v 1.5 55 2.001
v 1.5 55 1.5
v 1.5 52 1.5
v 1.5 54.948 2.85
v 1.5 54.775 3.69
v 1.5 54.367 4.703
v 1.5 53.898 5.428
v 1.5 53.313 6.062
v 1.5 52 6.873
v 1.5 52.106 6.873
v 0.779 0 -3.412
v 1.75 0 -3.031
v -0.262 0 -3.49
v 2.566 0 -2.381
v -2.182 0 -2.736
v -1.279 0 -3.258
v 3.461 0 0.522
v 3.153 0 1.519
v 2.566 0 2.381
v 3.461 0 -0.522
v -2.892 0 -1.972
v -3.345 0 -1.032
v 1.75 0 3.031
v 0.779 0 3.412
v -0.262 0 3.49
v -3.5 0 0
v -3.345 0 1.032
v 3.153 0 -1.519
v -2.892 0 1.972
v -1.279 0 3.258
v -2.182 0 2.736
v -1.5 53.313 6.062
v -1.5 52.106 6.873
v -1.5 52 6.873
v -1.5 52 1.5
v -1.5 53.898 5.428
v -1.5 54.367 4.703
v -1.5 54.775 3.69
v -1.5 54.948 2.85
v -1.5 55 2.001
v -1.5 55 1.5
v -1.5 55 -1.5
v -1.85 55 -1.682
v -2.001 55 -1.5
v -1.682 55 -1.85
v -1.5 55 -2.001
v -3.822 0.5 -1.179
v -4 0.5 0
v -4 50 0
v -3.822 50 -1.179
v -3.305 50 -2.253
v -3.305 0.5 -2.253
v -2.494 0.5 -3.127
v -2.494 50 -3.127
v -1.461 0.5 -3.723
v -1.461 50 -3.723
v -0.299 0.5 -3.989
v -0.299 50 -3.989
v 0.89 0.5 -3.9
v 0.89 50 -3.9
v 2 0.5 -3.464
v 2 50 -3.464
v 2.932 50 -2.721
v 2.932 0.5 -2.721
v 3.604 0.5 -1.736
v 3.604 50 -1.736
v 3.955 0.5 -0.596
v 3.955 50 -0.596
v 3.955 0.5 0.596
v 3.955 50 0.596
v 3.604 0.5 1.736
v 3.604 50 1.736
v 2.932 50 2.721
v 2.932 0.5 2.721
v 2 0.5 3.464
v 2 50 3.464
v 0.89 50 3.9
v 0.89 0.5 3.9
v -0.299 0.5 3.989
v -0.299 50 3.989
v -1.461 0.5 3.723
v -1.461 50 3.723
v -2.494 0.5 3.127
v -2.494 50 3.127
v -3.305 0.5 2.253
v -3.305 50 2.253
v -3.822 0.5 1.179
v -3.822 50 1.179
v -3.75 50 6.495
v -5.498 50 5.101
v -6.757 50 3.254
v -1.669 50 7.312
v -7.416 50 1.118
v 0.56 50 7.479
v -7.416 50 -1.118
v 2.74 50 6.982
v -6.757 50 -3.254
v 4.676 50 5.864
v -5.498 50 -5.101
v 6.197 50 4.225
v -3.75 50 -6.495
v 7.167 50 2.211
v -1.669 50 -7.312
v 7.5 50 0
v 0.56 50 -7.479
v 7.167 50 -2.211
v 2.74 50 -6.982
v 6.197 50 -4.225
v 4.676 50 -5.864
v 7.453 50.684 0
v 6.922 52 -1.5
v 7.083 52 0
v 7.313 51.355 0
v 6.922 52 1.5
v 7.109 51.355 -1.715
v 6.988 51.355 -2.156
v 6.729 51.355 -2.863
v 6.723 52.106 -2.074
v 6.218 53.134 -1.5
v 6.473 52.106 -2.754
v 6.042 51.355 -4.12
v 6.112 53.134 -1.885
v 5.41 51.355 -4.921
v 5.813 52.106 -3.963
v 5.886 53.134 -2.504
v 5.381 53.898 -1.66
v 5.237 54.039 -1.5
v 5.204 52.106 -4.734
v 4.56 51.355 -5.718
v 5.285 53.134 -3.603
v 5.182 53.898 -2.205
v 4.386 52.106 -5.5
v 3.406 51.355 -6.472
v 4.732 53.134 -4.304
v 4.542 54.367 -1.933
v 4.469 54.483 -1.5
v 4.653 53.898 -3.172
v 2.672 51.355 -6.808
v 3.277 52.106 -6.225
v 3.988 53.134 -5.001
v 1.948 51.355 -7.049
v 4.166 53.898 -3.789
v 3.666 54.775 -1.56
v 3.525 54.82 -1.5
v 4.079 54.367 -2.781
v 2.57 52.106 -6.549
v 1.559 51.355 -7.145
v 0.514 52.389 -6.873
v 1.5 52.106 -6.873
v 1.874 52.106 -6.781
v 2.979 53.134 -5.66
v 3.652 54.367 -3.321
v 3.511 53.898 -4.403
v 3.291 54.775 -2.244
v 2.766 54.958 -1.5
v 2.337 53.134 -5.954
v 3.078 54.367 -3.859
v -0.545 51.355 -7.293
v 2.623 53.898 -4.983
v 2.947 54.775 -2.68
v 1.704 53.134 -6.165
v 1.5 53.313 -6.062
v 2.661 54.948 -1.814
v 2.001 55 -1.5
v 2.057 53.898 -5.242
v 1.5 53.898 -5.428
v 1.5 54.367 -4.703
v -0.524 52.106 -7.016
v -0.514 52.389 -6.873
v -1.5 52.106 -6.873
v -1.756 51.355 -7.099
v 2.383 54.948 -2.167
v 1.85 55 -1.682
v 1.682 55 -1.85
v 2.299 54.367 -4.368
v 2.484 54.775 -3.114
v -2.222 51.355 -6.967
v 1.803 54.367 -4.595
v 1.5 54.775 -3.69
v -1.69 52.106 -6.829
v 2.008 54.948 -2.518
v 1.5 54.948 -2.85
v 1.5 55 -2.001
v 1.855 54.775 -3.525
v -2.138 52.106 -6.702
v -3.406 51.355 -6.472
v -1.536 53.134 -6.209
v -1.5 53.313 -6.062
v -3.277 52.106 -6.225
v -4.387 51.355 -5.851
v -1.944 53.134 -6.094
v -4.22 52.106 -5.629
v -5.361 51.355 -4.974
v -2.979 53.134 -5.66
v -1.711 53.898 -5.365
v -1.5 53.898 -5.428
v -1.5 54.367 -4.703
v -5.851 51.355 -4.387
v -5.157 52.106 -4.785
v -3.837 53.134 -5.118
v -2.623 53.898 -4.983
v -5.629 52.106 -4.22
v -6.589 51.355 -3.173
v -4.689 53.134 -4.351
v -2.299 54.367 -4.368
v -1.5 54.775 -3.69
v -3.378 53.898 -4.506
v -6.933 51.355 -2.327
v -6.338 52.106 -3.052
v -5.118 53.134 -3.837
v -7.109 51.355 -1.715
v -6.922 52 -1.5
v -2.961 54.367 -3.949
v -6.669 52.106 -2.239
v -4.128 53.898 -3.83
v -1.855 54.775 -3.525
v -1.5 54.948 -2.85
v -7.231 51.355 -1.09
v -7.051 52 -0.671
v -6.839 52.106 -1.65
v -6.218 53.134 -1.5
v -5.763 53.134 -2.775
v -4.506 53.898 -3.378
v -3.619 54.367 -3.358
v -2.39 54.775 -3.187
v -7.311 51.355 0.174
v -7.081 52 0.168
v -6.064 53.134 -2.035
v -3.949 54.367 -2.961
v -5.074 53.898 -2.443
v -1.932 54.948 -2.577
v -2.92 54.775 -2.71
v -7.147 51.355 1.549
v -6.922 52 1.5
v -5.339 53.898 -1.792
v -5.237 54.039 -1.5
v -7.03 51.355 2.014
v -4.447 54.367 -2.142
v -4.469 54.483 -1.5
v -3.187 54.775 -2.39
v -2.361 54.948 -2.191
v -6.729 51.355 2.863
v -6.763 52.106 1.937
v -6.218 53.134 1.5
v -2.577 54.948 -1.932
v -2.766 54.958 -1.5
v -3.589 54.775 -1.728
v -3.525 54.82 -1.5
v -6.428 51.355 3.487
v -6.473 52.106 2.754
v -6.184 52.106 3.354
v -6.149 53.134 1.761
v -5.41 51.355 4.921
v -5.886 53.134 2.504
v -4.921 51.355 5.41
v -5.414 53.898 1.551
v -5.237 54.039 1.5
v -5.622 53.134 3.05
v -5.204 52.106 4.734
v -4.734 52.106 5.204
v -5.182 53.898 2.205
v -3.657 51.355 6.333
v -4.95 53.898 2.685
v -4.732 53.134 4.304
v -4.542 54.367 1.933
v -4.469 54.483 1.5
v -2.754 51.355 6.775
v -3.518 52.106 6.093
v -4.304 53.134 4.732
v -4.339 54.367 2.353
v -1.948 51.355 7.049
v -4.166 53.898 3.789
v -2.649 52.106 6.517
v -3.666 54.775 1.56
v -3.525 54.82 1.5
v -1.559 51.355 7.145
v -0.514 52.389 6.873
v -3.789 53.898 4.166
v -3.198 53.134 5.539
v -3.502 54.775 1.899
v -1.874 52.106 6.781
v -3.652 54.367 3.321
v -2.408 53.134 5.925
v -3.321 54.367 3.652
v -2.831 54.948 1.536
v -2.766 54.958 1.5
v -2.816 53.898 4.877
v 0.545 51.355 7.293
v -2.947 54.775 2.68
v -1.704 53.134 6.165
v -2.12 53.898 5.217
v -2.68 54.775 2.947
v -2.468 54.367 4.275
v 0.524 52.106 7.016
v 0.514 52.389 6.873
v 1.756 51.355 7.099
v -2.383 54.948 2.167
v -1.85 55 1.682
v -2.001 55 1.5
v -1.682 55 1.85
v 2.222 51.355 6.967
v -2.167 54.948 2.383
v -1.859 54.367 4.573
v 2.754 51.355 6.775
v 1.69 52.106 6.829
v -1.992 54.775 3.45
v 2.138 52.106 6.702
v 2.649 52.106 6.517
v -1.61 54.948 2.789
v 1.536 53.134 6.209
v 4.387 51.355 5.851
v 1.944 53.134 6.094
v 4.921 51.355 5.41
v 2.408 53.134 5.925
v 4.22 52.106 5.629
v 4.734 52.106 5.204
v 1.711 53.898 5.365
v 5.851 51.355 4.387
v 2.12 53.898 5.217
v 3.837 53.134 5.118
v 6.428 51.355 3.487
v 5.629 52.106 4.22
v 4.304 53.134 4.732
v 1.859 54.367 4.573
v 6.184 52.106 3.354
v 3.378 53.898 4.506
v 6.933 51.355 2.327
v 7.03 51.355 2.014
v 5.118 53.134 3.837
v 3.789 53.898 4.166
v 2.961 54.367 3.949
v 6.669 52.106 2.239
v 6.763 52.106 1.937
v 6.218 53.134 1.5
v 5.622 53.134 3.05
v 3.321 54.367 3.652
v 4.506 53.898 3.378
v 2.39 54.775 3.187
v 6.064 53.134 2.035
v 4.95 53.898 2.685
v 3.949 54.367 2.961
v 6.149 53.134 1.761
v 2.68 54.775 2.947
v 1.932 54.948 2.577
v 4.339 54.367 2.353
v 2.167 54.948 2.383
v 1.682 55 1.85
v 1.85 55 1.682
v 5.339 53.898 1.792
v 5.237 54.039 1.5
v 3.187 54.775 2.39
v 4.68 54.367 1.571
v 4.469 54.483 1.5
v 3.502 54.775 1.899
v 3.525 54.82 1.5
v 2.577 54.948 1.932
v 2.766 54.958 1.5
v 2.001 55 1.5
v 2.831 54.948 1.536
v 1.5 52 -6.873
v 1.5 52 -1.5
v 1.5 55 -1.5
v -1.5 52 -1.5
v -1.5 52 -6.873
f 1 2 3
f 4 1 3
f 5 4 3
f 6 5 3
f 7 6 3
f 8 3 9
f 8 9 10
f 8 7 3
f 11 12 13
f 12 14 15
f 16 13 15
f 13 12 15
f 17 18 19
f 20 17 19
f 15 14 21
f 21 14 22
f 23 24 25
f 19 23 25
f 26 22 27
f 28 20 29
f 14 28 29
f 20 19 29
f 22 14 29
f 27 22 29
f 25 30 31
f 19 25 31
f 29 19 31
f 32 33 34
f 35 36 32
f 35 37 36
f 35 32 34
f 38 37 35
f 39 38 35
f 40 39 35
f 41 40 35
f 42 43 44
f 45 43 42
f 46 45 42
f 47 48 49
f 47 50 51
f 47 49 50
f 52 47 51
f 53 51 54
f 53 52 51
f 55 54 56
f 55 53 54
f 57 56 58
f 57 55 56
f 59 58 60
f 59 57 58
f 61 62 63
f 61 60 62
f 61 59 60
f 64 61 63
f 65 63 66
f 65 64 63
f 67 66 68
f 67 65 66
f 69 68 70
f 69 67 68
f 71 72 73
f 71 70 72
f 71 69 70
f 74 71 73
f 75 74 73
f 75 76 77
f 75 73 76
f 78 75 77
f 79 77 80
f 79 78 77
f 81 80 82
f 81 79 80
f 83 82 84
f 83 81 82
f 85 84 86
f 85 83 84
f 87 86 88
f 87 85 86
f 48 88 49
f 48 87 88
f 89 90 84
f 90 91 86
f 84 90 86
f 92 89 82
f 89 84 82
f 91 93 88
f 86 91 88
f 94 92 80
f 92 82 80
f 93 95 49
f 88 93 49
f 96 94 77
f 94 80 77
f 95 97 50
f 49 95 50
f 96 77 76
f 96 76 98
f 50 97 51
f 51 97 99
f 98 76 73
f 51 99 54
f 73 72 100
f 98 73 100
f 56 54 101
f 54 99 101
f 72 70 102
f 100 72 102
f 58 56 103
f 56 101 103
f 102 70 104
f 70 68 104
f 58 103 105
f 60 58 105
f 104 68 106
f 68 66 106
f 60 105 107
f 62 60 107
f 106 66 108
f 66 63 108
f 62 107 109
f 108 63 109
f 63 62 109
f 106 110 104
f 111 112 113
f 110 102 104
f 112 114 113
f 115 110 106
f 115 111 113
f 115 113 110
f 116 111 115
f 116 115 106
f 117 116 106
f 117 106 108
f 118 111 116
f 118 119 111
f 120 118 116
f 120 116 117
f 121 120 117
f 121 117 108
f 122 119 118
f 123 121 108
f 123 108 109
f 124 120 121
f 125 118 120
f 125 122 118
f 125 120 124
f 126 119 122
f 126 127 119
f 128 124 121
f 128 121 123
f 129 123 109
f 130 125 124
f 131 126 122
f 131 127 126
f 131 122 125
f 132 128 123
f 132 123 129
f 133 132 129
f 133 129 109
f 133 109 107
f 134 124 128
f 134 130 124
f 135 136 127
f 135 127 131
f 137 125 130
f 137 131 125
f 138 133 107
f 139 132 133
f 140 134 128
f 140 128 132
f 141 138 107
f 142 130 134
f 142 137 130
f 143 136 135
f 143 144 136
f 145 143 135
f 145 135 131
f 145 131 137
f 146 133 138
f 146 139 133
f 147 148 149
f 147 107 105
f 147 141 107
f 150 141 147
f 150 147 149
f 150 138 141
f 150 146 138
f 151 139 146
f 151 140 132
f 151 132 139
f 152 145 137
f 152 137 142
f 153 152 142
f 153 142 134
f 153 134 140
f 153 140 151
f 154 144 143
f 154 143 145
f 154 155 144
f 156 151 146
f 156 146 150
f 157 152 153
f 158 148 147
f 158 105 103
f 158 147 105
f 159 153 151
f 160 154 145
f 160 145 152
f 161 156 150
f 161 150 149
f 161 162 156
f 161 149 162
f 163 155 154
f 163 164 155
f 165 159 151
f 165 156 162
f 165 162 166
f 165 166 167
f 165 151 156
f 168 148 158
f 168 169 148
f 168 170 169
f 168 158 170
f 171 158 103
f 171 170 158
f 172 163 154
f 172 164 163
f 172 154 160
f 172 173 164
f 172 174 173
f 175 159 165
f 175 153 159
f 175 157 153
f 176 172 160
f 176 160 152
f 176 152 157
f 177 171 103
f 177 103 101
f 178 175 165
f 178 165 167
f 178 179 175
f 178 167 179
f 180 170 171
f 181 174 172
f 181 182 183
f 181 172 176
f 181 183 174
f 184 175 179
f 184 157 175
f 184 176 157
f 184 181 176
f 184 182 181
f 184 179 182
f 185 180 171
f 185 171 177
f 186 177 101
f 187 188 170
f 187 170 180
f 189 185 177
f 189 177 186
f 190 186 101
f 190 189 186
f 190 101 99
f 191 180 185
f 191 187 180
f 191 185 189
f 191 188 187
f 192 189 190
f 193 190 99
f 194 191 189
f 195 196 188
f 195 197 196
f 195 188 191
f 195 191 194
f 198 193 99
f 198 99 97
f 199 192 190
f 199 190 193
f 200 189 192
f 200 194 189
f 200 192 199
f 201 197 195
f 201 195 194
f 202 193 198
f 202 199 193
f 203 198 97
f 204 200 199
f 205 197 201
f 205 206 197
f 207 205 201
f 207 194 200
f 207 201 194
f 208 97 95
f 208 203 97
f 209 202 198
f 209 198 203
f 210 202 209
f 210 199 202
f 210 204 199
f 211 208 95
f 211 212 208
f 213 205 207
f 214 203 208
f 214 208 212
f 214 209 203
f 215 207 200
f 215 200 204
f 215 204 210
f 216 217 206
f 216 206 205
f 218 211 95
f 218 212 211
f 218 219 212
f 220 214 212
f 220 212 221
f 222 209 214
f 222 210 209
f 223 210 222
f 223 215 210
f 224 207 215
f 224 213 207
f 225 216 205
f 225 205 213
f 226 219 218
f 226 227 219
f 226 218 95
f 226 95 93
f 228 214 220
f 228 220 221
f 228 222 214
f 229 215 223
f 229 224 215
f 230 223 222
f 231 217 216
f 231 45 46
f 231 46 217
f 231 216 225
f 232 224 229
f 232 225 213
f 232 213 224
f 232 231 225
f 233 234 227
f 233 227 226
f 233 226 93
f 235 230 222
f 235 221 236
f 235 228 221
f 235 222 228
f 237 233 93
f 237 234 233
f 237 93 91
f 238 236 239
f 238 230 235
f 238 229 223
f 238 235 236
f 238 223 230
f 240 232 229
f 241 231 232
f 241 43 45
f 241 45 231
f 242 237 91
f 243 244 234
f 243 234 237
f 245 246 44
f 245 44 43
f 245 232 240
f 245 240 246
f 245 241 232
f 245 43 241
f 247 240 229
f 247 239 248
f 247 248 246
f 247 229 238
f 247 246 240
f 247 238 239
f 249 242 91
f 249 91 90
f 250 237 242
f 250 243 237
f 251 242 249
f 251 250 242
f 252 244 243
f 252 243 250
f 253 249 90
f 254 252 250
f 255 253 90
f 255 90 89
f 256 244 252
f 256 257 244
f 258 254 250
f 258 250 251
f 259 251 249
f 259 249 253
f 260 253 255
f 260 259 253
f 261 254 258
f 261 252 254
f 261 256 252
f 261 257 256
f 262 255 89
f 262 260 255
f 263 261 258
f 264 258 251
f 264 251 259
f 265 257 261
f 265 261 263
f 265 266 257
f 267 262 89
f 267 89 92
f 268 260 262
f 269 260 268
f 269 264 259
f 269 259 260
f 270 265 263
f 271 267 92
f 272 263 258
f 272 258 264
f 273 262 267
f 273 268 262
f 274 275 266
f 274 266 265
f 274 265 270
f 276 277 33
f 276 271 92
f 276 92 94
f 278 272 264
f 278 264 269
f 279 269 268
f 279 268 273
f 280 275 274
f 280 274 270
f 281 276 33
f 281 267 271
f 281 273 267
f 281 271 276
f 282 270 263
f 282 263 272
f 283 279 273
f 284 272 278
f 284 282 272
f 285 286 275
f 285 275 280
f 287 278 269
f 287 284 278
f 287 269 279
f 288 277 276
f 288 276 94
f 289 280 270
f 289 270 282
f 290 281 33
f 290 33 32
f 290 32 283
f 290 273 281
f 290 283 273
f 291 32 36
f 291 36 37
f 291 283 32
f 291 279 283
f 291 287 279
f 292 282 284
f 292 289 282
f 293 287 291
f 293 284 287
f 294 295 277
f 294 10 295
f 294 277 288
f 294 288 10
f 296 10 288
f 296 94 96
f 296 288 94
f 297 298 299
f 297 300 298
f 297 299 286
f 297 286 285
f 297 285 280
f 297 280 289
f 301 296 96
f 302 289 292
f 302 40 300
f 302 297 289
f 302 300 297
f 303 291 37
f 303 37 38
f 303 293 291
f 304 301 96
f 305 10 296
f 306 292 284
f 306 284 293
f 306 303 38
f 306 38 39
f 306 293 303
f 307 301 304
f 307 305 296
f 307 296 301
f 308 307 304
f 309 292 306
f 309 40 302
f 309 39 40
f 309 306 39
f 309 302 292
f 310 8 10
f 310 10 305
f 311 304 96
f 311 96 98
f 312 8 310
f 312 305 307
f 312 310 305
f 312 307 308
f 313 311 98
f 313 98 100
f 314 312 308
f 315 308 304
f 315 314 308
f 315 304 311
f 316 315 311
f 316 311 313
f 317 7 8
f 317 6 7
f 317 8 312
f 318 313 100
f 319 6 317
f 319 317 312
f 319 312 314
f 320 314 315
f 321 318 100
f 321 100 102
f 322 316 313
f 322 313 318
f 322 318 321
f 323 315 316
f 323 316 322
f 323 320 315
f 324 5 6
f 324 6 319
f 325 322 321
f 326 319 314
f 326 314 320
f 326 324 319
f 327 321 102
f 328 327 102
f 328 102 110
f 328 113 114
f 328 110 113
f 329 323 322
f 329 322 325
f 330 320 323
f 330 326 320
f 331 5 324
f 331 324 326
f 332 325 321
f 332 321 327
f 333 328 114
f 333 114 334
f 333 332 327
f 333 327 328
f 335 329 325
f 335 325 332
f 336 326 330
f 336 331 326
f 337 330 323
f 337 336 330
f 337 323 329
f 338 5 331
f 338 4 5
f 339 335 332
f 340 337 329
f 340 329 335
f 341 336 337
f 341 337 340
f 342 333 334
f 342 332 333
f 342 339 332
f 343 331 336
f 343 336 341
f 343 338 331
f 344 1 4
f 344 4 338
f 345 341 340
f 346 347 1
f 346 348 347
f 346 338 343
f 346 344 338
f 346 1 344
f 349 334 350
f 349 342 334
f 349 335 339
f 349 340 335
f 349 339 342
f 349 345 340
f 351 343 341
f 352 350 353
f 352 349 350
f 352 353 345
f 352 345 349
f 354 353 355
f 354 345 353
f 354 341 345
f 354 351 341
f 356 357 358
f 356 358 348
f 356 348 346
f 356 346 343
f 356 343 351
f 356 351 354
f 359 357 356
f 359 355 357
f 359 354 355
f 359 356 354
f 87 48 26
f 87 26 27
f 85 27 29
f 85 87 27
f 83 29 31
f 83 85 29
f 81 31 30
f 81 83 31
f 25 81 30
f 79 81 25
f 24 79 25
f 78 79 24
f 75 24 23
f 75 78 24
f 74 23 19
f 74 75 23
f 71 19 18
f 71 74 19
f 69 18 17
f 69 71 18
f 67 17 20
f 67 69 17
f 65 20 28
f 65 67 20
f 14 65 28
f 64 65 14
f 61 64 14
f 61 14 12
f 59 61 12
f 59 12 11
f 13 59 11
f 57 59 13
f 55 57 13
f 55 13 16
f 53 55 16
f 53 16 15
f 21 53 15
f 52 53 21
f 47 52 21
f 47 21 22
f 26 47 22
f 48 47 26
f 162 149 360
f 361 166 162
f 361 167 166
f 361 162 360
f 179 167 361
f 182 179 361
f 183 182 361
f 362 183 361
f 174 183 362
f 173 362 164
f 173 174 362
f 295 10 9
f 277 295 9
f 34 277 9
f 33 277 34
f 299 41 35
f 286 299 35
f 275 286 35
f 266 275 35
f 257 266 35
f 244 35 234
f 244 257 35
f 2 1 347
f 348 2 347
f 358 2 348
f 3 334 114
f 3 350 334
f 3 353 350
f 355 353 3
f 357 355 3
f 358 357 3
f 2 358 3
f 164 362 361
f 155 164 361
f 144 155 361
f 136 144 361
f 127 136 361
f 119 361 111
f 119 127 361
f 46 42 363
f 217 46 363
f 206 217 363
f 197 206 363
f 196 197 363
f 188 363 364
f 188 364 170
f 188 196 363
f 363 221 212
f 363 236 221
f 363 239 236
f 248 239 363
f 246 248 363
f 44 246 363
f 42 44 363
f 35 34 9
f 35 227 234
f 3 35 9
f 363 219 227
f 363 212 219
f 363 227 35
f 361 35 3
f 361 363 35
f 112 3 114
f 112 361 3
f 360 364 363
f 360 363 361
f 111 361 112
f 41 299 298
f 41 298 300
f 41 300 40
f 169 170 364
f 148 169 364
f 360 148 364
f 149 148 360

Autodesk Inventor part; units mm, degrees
ref_plane "YZ Plane" through (0, 0, 0) normal (1, 0, 0) x (0, 1, 0)
ref_plane "XZ Plane" through (0, 0, 0) normal (0, 1, 0) x (-1, 0, 0)
ref_plane "XY Plane" through (0, 0, 0) normal (0, 0, 1) x (1, 0, 0)
sketch "Sketch1" plane through (0, 0, 0) normal (0, 1, 0) x (-1, 0, 0)
  circle A0 centre (0, 0) radius 4
  dimension "d0" = 8
extrude "Extrusion1" add sketch "Sketch1" along normal blind 50
sketch "Sketch2" plane through (0, 50, 0) normal (0, 1, 0) x (1, 0, 0)
  circle A0 centre (0, 0) radius 7.5
  dimension "d3" = 15
extrude "Extrusion2" add sketch "Sketch2" along normal blind 5
fillet "Fillet1" radius 5 1 edges at (-7.5, 55, 0)
sketch "Sketch3" plane through (0, 55, 0) normal (0, 1, 0) x (1, 0, 0)
  line L0 (7.4391, -1.5) -> (-7.4391, -1.5)
  line L1 (-7.4391, -1.5) -> (-7.4391, 1.5)
  line L2 (-7.4391, 1.5) -> (7.4391, 1.5)
  line L3 (7.4391, 1.5) -> (7.4391, -1.5)
  line L4 (7.4391, -1.5) -> (-7.4391, 1.5) construction
  line L5 (-7.4391, -1.5) -> (7.4391, 1.5) construction
  line L6 (1.5, -6.8733) -> (-1.5, -6.8733)
  line L7 (-1.5, -6.8733) -> (-1.5, 6.8733)
  line L8 (-1.5, 6.8733) -> (1.5, 6.8733)
  line L9 (1.5, 6.8733) -> (1.5, -6.8733)
  line L10 (1.5, -6.8733) -> (-1.5, 6.8733) construction
  line L11 (-1.5, -6.8733) -> (1.5, 6.8733) construction
  point P0 (0, 0)
  dimension "d7" = 3
  dimension "d8" = 3
extrude "Extrusion3" cut sketch "Sketch3" against normal blind 3
thread "Thread1" size "M8x1.25" class "6g" standard "ANSI Metric M Profile" full length
chamfer "Chamfer1" distance 0.5 angle 45 1 edges at (4, 0, 0)
properties part number "Vijs"
